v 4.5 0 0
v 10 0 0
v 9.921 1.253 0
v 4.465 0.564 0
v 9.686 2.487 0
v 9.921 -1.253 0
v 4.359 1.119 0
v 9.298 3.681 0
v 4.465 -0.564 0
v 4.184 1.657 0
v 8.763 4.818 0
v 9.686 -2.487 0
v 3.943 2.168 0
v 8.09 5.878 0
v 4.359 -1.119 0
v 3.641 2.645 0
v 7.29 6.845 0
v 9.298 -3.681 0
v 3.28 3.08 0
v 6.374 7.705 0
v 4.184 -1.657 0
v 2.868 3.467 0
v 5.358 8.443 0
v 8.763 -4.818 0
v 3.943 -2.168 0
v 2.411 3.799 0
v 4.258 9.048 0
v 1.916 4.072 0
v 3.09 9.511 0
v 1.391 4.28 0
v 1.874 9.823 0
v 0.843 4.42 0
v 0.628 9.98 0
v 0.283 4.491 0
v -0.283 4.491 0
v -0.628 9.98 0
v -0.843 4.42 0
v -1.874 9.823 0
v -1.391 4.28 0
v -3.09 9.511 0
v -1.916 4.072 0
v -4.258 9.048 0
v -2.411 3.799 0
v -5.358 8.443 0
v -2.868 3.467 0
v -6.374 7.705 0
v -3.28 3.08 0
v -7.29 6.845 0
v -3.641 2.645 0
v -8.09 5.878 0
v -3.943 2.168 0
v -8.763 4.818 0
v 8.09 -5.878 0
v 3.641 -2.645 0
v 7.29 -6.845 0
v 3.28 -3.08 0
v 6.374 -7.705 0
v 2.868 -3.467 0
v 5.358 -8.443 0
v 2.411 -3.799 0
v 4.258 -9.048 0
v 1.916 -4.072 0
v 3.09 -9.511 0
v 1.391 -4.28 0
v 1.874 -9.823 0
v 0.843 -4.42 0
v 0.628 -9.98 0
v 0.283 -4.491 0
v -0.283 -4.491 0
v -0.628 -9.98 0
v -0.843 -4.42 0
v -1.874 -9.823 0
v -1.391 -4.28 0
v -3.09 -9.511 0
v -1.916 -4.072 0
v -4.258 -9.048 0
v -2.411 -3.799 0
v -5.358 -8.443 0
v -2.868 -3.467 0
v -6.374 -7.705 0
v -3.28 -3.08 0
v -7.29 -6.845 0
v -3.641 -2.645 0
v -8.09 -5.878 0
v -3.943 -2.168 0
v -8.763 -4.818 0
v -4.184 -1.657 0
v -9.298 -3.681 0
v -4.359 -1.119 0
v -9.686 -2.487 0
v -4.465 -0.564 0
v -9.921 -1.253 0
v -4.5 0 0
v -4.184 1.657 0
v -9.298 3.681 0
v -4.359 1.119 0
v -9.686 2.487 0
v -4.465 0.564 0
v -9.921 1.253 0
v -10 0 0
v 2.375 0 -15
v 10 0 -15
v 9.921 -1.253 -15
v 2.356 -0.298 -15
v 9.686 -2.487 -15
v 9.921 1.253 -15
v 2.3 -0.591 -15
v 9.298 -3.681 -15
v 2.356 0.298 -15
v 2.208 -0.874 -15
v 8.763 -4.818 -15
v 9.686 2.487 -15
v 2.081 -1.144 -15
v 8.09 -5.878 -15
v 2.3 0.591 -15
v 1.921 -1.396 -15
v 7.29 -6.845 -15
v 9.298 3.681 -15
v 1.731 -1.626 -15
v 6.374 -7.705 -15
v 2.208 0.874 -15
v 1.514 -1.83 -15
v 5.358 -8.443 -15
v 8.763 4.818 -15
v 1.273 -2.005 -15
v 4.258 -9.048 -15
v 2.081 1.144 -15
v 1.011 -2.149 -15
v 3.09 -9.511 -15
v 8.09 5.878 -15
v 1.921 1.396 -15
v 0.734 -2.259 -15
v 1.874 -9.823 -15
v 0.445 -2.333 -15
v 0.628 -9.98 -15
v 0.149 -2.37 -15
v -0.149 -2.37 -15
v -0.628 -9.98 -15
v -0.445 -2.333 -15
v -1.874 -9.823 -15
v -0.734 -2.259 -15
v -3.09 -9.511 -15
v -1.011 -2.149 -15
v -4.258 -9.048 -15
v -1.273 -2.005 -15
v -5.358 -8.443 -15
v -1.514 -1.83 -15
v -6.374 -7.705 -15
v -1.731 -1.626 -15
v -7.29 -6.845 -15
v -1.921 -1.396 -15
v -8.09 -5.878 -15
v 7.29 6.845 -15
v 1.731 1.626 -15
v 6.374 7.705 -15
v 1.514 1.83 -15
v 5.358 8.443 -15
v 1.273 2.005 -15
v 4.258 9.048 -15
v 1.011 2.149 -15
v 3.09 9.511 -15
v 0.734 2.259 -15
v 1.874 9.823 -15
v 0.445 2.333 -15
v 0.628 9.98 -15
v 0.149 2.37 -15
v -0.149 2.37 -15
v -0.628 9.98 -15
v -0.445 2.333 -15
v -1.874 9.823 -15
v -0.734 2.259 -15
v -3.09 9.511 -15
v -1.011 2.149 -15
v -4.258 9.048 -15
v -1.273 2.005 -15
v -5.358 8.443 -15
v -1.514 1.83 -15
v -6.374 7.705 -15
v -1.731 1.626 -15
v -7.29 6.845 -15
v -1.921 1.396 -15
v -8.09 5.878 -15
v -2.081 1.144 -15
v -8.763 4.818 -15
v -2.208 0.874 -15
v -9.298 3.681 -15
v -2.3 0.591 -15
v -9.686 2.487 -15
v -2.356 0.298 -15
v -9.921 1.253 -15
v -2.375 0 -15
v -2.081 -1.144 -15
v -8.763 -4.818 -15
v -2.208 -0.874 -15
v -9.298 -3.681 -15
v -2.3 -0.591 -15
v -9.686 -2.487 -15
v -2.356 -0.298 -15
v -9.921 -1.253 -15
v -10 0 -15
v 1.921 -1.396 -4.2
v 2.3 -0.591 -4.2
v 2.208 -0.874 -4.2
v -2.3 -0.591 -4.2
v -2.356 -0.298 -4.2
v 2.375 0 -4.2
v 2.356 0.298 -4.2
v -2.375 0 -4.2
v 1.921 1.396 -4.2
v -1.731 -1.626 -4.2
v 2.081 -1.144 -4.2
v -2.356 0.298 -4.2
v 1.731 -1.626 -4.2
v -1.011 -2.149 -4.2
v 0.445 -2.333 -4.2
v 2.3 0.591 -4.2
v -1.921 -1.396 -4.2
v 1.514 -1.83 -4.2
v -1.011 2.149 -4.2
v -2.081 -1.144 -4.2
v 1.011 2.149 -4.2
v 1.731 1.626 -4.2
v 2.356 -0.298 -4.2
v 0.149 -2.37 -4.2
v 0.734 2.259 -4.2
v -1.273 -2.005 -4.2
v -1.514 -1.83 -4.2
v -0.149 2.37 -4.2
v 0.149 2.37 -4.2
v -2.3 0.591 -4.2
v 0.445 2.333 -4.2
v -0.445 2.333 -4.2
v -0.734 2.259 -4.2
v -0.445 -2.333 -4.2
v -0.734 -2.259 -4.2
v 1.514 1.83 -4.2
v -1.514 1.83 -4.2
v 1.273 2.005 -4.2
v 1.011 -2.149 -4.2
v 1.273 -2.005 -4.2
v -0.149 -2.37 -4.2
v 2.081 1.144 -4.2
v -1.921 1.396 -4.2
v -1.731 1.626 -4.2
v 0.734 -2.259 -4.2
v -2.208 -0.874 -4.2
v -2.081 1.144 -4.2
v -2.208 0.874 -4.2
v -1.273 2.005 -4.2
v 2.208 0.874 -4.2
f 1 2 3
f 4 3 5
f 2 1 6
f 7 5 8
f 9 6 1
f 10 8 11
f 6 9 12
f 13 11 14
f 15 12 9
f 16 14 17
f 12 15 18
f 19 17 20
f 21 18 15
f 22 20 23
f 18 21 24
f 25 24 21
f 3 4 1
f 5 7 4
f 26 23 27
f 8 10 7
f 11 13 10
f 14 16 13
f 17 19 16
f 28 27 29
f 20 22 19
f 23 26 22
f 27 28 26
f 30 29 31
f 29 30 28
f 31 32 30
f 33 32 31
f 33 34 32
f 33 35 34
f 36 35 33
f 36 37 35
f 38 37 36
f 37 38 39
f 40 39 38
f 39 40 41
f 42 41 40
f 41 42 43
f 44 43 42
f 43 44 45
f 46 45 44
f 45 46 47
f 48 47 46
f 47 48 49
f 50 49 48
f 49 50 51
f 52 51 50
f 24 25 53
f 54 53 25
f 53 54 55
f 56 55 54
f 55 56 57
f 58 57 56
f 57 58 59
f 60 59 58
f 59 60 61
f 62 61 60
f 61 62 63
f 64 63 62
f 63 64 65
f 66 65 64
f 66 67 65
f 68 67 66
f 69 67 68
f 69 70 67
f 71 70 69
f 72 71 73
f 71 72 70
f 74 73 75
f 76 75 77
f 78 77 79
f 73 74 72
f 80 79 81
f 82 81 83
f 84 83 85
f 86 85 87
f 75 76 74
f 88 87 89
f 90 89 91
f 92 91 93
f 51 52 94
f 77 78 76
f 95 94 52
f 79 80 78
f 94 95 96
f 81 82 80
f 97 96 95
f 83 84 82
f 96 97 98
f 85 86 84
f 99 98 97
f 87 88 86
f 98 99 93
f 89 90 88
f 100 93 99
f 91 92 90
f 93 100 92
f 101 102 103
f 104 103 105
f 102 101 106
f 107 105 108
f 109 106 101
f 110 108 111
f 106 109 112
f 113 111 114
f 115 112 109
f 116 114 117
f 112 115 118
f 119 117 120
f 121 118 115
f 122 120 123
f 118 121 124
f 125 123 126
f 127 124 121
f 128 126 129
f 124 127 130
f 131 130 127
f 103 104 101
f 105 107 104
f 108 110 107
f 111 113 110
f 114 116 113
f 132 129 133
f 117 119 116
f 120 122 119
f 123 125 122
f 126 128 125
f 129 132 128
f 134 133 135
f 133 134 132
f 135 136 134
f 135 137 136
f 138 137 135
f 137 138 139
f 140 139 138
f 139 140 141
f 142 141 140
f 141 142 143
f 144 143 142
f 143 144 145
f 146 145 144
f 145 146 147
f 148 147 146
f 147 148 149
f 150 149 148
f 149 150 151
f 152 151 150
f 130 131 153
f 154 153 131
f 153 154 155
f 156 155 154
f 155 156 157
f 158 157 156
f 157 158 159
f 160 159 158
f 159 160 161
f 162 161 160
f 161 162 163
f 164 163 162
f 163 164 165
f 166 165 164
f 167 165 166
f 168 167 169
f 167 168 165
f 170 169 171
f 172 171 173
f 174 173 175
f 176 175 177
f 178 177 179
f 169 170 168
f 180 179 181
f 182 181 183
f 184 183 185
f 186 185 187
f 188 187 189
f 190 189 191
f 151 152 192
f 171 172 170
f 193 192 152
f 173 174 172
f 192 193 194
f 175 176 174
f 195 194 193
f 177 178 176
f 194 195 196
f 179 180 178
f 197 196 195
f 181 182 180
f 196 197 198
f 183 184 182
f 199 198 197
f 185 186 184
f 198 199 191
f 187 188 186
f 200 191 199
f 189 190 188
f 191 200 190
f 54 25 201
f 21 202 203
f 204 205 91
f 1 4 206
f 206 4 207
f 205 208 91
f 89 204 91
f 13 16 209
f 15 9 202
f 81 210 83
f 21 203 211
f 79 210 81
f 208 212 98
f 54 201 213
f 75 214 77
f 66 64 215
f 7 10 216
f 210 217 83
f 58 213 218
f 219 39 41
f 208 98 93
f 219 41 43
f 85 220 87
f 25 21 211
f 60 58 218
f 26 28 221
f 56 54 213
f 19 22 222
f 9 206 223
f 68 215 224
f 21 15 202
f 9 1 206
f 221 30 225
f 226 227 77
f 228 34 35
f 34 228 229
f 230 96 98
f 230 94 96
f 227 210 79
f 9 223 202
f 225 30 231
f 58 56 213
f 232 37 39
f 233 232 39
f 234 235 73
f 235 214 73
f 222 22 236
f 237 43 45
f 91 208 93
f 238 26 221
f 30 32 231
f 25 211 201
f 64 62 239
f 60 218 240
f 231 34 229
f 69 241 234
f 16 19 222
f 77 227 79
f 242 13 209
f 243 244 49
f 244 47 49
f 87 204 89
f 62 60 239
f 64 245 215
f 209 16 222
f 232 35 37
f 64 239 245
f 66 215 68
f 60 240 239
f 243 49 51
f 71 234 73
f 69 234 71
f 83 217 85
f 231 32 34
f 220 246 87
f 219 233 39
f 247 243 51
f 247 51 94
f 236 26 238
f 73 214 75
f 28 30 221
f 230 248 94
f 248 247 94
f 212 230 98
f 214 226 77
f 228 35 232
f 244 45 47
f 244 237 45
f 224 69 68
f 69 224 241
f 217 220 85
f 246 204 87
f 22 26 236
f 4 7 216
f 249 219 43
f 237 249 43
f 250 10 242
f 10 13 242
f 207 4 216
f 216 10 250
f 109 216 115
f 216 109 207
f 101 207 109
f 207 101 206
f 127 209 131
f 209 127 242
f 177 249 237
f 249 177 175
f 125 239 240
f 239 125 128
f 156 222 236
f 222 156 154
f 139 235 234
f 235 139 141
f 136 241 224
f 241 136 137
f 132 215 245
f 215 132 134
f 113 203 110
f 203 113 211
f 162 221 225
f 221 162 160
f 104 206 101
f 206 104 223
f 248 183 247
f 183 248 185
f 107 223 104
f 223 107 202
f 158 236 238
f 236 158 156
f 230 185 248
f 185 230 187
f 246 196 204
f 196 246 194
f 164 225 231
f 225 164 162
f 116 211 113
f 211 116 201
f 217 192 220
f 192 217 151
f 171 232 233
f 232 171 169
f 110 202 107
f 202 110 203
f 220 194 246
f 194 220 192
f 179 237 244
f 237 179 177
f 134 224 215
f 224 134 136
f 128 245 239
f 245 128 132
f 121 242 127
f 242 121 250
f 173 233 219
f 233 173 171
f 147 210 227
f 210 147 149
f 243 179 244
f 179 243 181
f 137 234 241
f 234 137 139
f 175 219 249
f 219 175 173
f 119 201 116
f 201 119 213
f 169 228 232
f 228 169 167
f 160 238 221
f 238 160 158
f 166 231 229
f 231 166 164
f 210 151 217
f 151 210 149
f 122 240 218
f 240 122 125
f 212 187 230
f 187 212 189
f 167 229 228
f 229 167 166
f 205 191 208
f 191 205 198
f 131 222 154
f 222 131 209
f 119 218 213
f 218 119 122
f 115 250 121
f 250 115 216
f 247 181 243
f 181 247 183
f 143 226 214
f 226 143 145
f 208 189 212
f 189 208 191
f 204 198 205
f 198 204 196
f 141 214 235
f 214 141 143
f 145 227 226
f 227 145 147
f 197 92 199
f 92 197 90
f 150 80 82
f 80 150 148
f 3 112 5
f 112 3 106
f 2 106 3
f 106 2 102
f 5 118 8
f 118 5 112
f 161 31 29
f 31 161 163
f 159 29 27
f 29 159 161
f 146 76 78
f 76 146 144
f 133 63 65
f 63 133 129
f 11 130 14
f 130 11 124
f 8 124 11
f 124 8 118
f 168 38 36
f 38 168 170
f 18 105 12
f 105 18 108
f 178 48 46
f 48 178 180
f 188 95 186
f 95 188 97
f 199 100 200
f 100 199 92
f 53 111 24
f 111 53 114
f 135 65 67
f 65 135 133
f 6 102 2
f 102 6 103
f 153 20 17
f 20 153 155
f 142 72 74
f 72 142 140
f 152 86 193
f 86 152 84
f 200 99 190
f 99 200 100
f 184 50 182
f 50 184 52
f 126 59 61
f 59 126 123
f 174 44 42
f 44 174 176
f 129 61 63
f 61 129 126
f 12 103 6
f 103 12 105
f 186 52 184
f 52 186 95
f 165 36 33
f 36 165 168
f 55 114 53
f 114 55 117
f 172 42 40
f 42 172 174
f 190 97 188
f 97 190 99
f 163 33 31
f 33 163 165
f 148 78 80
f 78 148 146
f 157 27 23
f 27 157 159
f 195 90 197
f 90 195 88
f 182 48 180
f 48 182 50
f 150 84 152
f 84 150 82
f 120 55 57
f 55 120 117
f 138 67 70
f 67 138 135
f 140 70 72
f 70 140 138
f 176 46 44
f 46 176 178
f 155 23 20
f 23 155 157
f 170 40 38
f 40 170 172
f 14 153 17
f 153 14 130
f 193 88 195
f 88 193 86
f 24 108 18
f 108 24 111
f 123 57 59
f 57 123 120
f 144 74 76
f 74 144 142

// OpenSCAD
$fn = 50;


difference() {
	union() {
		translate(v = [0, 0, -15.0000000000]) {
			cylinder(h = 15, r = 10.0000000000);
		}
		cylinder(h = 0, r = 20.0000000000);
	}
	union() {
		translate(v = [0, 0, 0]) {
			rotate(a = [0, 0, 0]) {
				difference() {
					union() {
						#translate(v = [0, 0, -15.0000000000]) {
							cylinder(h = 15, r = 2.2500000000);
						}
						#translate(v = [0, 0, -4.2000000000]) {
							cylinder(h = 4.2000000000, r1 = 2.3750000000, r2 = 4.5000000000);
						}
						#translate(v = [0, 0, -15.0000000000]) {
							cylinder(h = 15, r = 2.3750000000);
						}
						#translate(v = [0, 0, -15.0000000000]) {
							cylinder(h = 15, r = 2.2500000000);
						}
					}
					union();
				}
			}
		}
	}
}
